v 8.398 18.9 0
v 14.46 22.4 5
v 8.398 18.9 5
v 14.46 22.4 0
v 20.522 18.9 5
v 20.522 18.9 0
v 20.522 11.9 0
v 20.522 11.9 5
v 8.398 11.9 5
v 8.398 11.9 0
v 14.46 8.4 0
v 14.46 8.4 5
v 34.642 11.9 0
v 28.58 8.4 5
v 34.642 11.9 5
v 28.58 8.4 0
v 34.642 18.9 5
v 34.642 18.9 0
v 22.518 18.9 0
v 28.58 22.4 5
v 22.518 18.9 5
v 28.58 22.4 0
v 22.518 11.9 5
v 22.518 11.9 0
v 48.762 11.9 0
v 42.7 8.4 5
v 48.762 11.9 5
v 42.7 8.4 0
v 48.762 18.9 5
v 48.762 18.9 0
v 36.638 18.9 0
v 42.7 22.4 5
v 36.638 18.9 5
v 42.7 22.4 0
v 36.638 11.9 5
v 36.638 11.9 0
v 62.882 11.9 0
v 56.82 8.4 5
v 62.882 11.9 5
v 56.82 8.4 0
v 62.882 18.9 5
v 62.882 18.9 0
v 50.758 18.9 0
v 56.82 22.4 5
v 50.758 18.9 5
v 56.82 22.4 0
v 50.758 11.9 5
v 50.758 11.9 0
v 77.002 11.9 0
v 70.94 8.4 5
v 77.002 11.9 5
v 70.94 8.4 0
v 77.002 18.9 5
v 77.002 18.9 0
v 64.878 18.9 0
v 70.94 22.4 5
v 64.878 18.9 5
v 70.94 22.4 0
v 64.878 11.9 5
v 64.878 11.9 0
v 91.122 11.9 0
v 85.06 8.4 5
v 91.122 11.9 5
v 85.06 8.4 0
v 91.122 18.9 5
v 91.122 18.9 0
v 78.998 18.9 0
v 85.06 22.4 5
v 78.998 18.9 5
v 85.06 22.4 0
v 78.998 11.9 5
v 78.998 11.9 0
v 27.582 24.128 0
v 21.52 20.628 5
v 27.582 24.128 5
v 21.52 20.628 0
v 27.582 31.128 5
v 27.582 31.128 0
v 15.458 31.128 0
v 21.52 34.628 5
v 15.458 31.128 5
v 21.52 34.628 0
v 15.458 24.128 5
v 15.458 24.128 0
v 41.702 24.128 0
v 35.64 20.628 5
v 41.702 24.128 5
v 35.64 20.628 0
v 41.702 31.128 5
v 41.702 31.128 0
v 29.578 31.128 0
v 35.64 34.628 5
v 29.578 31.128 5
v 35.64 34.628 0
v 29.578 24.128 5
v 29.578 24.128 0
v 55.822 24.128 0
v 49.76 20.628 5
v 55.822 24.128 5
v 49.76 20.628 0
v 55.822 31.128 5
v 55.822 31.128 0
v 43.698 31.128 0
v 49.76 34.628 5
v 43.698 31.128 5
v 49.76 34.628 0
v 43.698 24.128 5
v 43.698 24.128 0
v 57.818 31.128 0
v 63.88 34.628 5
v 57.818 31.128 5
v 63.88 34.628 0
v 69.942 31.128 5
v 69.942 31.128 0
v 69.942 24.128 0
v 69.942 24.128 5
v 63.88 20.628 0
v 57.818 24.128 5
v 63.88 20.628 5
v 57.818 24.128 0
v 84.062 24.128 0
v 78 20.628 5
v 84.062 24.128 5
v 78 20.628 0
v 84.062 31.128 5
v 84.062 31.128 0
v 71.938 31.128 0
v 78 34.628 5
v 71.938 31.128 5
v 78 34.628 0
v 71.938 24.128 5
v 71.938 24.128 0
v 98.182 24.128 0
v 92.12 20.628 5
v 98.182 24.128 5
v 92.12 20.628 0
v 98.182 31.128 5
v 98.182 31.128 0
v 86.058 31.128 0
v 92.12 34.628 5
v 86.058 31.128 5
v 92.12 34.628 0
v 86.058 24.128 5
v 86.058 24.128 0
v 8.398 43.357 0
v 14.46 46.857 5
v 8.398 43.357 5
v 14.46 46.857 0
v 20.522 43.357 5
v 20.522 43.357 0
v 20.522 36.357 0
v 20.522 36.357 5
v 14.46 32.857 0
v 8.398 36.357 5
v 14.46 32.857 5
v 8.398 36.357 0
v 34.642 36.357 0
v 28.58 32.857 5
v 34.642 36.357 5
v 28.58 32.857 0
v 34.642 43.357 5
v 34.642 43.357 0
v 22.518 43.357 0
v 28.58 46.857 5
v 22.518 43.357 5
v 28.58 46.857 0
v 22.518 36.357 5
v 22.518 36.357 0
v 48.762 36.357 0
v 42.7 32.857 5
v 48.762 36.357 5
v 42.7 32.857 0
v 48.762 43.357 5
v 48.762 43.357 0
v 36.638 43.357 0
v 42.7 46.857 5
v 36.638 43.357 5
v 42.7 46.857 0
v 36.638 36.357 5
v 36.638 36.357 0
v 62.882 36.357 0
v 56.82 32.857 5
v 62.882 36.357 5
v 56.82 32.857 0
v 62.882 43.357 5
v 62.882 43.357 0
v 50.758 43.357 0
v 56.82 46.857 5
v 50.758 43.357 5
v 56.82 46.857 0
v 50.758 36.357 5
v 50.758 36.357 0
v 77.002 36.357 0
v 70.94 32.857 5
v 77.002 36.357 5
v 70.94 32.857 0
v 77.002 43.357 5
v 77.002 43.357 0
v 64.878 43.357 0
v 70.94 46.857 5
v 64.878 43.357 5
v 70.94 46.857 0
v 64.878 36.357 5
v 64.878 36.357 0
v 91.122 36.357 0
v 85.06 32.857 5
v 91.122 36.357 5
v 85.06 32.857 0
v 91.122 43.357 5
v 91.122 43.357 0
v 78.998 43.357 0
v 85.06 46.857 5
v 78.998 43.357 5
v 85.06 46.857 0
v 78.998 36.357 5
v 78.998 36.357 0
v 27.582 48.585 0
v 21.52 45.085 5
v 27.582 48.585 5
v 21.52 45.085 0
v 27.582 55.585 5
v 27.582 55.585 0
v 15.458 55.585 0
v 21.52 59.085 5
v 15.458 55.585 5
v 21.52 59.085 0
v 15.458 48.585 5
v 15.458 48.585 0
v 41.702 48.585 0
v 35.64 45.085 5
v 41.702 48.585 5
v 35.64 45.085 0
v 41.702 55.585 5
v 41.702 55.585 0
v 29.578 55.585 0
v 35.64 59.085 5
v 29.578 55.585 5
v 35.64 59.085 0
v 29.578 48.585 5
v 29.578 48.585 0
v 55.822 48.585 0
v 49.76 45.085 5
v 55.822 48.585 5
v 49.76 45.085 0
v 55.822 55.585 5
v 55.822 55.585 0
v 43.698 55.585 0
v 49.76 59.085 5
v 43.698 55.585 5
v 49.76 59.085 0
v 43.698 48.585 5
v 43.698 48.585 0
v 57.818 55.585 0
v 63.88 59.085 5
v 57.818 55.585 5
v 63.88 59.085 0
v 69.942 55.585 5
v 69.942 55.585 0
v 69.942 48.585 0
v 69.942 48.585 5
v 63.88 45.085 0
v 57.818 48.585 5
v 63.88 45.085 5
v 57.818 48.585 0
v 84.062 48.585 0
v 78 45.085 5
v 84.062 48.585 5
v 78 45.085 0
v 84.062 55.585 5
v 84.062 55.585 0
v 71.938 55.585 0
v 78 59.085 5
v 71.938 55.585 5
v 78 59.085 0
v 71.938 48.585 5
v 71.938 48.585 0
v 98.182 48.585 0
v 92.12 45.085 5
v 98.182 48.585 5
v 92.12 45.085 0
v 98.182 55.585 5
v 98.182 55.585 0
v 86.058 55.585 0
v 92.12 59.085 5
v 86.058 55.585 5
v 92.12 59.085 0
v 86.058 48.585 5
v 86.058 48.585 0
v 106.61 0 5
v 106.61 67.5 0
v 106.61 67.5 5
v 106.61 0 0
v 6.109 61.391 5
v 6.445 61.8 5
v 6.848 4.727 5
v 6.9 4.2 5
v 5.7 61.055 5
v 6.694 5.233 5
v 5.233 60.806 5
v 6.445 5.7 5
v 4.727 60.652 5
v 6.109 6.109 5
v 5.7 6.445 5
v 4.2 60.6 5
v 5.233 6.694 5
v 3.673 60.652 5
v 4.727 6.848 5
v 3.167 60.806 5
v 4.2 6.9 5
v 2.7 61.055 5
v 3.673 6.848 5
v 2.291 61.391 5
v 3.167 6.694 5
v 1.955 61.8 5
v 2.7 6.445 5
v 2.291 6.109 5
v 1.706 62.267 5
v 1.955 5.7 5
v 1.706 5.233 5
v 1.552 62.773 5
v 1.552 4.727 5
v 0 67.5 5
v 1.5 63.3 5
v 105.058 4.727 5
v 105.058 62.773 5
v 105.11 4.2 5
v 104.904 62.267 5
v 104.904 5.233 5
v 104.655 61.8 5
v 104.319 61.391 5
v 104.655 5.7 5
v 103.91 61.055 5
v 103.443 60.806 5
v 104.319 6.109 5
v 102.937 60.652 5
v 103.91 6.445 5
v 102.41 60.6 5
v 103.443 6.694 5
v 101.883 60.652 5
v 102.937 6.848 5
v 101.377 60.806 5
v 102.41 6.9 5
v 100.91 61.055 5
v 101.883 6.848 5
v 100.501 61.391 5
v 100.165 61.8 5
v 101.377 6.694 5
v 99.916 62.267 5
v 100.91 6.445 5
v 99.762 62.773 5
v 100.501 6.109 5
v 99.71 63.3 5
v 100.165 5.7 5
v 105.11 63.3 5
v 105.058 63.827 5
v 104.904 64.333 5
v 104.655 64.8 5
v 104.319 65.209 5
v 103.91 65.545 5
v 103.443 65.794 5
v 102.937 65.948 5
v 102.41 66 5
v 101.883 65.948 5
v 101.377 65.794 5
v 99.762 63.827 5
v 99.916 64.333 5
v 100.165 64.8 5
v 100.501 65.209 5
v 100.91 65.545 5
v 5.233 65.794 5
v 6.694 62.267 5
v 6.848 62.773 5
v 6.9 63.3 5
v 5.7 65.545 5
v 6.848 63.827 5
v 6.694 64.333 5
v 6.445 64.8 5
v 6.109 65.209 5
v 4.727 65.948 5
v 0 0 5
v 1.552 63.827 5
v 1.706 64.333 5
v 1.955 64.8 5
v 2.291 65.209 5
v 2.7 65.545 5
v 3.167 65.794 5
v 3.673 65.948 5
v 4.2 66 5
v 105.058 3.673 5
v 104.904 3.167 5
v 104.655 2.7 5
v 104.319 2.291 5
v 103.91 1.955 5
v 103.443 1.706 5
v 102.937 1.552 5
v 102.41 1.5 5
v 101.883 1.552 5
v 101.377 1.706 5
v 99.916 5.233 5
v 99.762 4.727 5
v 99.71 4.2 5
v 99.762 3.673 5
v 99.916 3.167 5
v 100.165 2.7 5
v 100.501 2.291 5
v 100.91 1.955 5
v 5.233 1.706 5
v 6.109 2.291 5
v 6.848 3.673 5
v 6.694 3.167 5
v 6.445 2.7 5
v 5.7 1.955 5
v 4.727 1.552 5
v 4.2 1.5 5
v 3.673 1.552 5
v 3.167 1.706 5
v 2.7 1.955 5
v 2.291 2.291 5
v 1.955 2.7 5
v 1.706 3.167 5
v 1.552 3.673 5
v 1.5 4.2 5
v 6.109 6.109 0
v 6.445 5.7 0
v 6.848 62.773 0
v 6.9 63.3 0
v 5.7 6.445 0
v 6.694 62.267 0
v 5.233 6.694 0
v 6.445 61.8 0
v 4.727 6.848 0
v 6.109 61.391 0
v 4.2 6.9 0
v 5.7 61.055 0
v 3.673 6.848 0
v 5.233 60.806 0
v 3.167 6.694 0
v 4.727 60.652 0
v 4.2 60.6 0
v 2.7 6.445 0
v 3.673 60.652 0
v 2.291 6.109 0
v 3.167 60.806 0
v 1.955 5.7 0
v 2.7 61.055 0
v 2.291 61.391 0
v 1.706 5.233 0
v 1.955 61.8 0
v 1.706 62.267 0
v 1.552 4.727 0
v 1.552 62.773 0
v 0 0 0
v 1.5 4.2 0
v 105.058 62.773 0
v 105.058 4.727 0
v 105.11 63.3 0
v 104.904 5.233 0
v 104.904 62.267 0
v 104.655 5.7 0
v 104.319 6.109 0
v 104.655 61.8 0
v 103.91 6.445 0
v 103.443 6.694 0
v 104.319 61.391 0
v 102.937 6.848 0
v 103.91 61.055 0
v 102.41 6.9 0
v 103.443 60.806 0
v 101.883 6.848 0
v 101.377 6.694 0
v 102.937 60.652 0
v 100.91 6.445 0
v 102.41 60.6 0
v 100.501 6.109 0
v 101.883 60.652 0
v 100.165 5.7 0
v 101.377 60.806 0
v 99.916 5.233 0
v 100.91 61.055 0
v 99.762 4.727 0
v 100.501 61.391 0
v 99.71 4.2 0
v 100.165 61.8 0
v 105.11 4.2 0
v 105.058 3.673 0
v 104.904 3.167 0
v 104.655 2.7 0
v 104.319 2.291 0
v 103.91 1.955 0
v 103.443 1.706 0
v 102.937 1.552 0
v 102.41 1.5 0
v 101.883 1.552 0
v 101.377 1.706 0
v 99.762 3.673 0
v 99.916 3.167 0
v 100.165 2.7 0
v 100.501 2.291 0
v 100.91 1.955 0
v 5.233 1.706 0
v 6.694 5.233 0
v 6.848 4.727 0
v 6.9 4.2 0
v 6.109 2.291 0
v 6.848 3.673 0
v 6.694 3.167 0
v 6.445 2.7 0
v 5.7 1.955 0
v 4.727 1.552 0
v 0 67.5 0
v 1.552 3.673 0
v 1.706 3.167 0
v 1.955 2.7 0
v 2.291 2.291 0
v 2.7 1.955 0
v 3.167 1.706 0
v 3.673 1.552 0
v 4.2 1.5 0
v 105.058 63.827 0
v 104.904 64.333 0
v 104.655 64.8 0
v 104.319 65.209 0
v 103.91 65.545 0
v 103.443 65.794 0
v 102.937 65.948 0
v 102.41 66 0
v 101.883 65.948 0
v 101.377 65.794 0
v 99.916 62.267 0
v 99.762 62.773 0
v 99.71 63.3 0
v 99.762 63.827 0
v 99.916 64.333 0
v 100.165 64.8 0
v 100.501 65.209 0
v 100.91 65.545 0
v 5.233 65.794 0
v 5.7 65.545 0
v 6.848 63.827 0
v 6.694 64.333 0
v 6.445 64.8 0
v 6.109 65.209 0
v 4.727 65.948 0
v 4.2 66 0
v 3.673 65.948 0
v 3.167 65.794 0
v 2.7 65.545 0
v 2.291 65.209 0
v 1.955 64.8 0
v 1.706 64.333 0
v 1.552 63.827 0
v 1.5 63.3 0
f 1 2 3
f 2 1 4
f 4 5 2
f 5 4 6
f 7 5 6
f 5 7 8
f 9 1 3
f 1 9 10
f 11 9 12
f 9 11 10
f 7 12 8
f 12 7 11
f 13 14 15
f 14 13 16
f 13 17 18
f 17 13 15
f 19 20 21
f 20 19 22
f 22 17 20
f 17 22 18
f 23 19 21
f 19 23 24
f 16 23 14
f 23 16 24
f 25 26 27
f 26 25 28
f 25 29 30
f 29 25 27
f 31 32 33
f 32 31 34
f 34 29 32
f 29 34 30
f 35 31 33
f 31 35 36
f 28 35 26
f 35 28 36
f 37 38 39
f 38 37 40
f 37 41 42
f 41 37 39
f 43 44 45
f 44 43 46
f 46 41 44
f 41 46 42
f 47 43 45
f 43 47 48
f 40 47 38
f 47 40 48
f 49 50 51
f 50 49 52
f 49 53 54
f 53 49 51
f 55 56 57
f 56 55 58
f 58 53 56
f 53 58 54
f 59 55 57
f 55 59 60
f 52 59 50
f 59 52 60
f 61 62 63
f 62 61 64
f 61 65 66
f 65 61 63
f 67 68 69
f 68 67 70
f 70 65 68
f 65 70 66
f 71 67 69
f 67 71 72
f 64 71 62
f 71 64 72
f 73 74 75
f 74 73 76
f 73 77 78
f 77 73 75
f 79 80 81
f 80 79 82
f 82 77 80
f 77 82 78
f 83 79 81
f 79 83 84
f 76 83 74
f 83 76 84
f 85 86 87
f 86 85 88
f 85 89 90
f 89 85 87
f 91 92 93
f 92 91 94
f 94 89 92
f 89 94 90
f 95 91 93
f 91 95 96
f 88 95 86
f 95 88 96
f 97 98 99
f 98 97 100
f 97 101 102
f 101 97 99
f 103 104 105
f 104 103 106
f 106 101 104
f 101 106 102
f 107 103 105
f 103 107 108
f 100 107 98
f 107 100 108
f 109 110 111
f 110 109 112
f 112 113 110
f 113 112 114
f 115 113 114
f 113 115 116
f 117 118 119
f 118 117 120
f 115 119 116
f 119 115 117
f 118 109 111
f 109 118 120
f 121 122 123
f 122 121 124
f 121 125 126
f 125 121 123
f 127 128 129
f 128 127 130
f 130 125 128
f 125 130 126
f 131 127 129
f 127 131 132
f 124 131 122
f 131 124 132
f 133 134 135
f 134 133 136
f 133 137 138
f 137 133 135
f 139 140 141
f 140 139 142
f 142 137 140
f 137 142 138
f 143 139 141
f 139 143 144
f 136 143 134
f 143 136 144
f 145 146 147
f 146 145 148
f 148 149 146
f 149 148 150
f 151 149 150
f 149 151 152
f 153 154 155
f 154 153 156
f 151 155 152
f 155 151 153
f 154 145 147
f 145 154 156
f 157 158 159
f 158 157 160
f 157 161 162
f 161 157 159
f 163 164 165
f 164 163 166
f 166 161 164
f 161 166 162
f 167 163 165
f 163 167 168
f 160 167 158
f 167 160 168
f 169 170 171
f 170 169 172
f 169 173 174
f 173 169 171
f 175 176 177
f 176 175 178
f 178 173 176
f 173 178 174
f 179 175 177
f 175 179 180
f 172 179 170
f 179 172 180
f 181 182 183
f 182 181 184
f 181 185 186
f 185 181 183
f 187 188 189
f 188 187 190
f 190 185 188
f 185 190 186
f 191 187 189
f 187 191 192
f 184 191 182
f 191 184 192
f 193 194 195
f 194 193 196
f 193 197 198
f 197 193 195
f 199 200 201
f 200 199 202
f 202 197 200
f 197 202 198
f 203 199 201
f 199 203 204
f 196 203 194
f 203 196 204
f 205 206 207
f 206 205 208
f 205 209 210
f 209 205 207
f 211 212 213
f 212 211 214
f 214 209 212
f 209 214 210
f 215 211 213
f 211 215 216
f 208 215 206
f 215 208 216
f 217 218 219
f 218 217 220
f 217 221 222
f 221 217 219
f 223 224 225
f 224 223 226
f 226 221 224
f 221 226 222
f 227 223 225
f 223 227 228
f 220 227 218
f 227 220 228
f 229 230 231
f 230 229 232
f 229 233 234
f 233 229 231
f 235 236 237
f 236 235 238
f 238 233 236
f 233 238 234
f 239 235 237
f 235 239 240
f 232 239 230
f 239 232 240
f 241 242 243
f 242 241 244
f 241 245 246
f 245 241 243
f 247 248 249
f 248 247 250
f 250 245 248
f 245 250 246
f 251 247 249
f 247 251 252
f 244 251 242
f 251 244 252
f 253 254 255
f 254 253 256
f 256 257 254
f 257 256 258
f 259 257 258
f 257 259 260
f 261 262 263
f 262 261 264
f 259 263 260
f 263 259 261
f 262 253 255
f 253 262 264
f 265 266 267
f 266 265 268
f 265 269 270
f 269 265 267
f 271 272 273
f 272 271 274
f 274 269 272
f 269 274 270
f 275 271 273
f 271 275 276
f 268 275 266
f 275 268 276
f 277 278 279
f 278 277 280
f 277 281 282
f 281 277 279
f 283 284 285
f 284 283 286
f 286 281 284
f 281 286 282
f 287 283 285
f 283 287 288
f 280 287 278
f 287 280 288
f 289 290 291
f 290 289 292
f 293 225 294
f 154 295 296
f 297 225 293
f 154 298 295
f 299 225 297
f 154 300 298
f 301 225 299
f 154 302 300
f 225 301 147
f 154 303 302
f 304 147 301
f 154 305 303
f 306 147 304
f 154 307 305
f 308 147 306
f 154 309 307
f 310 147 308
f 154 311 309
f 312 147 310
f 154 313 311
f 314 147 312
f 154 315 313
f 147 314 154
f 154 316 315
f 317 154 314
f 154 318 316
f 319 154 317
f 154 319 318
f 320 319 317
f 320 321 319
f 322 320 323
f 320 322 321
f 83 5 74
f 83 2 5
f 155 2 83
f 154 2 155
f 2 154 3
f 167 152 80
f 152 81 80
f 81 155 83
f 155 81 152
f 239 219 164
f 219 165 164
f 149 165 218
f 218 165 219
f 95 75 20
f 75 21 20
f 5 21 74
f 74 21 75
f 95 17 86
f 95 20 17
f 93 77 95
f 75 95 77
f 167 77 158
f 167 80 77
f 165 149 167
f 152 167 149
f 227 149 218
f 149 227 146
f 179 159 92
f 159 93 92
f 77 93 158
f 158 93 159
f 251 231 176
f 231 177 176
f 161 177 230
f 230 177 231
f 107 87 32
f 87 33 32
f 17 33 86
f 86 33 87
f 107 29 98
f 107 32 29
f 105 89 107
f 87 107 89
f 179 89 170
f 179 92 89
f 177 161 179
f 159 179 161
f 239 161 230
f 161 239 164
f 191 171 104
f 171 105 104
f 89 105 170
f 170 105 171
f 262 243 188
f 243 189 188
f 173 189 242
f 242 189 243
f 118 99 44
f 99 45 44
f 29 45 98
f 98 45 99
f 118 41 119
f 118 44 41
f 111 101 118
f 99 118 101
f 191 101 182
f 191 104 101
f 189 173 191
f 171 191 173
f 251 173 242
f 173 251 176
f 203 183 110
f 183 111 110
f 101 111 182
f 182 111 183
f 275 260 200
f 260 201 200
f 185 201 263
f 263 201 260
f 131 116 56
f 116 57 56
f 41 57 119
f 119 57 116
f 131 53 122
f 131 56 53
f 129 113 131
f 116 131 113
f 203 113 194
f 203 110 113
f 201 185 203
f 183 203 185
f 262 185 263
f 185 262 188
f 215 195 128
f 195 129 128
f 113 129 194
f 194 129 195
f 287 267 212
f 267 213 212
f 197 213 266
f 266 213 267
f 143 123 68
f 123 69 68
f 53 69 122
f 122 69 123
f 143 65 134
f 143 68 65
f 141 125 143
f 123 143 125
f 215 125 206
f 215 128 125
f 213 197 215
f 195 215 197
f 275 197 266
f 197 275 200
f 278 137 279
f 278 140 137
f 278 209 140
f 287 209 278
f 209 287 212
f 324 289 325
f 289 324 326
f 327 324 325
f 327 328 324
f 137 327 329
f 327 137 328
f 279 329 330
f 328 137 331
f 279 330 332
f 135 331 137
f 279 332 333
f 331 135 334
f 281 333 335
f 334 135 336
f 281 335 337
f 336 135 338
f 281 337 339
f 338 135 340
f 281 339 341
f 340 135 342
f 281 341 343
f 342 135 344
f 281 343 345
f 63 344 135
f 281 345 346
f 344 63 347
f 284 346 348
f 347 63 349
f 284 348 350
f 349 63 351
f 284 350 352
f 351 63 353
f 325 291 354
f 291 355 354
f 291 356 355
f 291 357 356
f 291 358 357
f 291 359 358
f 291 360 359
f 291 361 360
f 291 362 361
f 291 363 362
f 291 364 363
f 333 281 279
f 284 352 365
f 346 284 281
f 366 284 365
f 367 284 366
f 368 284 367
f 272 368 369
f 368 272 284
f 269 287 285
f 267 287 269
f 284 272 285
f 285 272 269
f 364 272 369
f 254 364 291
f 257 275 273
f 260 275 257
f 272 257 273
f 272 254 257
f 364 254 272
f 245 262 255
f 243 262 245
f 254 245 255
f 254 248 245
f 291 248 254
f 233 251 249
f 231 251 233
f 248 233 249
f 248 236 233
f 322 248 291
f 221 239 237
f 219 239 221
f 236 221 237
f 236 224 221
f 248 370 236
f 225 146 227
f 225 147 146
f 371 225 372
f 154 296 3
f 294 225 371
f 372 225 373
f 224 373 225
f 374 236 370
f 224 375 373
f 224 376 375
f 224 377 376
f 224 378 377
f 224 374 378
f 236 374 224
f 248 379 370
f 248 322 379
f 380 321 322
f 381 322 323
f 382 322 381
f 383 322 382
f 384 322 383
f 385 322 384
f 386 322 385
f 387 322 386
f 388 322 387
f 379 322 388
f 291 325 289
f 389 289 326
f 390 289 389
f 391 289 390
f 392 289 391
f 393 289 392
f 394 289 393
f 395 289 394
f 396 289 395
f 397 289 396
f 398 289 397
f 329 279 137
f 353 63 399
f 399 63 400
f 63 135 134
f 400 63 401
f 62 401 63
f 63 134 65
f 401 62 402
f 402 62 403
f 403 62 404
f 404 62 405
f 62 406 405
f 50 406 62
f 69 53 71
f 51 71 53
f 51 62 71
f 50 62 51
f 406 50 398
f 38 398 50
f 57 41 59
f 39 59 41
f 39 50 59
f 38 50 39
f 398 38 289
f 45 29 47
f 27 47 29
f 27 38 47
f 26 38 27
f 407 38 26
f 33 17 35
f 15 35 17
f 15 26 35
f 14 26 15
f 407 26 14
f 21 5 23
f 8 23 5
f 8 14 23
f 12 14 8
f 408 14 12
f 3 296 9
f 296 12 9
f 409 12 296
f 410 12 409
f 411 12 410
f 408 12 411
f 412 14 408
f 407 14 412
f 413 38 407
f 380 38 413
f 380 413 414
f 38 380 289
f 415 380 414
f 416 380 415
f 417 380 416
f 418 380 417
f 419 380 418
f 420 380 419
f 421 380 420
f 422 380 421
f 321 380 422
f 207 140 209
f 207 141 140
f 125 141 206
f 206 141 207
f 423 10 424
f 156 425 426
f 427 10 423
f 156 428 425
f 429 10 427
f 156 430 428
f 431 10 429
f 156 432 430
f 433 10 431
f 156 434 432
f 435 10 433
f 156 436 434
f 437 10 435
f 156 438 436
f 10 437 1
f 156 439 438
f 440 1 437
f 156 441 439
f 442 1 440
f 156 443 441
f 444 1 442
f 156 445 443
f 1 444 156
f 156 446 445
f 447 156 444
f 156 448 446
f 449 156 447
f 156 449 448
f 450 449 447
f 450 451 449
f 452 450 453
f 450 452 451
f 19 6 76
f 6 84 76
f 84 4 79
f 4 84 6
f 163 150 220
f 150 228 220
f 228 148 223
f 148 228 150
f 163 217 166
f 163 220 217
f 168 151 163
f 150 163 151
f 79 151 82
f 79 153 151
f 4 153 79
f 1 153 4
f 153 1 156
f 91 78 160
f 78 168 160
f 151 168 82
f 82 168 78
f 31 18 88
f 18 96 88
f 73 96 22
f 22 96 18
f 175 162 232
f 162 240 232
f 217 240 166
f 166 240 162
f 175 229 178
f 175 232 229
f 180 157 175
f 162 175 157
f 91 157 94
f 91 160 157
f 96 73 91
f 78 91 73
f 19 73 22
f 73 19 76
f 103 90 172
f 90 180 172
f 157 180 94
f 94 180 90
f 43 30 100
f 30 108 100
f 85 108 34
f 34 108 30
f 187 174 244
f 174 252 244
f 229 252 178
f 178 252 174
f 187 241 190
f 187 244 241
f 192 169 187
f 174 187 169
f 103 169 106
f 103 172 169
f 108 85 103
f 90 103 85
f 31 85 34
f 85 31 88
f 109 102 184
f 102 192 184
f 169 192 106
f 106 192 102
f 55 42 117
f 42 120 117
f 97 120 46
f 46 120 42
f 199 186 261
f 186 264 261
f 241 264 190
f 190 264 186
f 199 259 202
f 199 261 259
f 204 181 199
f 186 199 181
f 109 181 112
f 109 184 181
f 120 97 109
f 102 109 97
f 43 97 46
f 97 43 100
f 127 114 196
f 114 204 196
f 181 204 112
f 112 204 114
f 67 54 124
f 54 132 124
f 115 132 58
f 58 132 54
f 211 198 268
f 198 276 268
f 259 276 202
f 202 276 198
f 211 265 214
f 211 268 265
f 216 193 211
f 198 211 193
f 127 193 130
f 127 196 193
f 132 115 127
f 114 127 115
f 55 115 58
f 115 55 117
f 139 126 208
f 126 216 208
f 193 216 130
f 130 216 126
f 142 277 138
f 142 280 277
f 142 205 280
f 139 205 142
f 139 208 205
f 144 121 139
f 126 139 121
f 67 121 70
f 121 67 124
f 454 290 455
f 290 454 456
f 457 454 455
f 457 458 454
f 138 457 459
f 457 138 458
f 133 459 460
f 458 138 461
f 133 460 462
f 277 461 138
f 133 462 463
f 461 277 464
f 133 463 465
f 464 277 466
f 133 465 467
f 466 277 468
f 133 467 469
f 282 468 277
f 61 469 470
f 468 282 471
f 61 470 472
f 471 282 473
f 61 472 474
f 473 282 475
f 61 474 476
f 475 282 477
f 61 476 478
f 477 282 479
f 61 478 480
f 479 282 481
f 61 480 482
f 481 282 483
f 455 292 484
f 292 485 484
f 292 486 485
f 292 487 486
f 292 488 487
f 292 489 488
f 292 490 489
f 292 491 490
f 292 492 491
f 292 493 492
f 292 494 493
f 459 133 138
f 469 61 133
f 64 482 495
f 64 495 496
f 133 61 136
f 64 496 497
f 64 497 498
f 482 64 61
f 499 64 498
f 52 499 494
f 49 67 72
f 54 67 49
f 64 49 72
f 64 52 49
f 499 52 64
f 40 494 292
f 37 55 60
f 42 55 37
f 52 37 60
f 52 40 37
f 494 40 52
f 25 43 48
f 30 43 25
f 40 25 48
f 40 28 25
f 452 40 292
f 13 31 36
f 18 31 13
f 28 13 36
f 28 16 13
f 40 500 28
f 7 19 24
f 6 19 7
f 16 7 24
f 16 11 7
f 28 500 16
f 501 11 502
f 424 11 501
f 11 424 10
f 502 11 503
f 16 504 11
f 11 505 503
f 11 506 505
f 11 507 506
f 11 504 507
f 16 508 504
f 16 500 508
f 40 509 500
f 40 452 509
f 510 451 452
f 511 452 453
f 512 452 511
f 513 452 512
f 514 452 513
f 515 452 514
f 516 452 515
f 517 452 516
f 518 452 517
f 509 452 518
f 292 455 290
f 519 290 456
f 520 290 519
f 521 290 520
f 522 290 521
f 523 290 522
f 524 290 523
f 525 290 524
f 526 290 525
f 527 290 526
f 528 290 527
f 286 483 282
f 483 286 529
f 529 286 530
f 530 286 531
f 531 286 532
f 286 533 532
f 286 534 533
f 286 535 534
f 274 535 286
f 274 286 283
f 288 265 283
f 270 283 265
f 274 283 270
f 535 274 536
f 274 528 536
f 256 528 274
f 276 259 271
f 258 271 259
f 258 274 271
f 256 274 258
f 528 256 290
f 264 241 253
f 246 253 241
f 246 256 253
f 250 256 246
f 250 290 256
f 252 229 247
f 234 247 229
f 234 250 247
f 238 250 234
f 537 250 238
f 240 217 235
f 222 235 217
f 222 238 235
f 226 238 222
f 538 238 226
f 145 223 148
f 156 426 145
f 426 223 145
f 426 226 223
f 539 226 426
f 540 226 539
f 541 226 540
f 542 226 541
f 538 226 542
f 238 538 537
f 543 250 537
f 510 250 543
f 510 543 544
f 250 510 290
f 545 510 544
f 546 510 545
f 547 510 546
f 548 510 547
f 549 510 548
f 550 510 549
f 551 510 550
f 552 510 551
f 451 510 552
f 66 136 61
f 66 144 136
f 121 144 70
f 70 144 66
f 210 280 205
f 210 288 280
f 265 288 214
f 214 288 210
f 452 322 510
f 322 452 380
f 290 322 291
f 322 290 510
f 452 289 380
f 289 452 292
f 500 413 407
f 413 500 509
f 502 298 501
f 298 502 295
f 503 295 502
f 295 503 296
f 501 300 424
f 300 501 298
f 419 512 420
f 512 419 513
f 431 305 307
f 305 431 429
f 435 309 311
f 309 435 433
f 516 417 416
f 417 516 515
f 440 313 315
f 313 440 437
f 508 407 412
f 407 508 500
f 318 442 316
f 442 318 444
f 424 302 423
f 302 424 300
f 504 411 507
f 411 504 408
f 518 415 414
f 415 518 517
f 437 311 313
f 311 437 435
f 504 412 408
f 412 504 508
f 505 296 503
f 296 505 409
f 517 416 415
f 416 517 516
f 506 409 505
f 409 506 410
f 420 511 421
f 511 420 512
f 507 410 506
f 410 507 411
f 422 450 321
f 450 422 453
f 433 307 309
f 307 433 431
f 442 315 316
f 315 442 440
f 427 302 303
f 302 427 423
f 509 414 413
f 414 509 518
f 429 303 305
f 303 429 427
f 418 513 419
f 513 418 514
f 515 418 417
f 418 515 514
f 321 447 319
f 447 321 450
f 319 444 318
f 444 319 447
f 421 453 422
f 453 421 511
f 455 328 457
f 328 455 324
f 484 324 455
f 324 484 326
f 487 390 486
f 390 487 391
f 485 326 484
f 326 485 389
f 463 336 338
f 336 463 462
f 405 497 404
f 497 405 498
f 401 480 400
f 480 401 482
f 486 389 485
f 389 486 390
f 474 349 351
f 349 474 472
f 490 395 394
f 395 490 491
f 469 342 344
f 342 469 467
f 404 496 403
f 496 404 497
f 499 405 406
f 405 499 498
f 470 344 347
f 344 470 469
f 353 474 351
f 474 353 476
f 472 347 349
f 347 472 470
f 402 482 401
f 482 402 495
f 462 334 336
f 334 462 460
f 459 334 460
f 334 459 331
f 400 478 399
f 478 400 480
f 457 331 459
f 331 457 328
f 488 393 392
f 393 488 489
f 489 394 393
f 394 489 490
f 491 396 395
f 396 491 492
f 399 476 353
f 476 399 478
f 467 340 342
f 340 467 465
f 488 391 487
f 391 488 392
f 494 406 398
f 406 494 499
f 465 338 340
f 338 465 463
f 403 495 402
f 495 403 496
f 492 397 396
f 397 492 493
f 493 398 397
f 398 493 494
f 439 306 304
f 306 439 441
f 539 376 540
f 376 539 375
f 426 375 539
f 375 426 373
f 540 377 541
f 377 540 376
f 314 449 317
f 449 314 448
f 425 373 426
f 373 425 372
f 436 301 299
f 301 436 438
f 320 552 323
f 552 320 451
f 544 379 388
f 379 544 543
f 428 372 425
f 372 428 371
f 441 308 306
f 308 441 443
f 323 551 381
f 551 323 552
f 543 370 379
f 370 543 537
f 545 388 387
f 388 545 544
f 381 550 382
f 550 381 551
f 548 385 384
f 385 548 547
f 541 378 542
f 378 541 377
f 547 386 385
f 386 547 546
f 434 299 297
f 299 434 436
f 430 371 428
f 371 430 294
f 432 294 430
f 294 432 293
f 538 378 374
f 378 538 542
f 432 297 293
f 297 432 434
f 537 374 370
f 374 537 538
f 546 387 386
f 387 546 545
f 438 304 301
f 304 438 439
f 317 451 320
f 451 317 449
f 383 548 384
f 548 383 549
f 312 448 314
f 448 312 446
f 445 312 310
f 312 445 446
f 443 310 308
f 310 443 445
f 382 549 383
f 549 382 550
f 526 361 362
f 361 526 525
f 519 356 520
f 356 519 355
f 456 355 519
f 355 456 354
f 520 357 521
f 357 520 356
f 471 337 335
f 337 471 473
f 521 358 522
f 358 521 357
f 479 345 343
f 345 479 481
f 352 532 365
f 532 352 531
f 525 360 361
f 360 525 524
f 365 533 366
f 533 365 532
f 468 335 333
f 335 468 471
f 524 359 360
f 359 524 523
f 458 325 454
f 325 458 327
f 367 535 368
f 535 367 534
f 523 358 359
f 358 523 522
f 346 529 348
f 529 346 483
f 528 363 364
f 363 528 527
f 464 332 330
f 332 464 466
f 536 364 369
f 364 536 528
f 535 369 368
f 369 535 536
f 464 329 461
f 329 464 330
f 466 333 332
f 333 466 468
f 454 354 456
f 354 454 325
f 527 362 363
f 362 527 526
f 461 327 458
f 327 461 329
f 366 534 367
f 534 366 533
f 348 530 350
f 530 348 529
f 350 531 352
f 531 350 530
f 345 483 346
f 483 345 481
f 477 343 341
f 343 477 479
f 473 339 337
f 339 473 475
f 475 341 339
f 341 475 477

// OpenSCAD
$fn = 32;

// ----------------------------------------------------------------------
// Honeycomb panel: 106.61 x 67.5 mm, 24 cells of 14 mm
// ----------------------------------------------------------------------

// --- parameters (mm) ---
panel_w = 106.61;         // panel width
panel_d = 67.5;           // panel depth
thick = 5;                // panel thickness
cell_r = 7;               // hex cell circumradius
pitch = 14.12;            // hex cell pitch (centre to centre)
web = 2;                  // web between the cells
columns = 6;              // columns of cells
rows = 4;                 // rows of cells
cell_count = 24;          // total cells
shift_x = 14.46;          // first cell offset in x
shift_y = 15.4;           // first cell offset in y
mount_d = 5.4;            // corner mounting holes
hole_off = 4.2;           // mounting hole offset from the corners

difference() {
  union() {
    cube([panel_w, panel_d, thick]);
  }
  /* hexagonal cells, point-up, cut right through the plate */
  for (row = [0 : rows - 1]) {
    for (col = [0 : columns - 1]) {
      translate([shift_x + col * pitch + (row % 2) * pitch / 2, shift_y + row * pitch * 0.866025, -2.5]) rotate([0, 0, 30]) cylinder(h = thick + 5, d = 2 * cell_r, $fn = 6);
    }
  }
  /* corner mounting holes, clear of the outer cell web */
  translate([4.2, 4.2, -2.5]) cylinder(h = thick + 5, d = mount_d);
  translate([102.41, 4.2, -2.5]) cylinder(h = thick + 5, d = mount_d);
  translate([4.2, 63.3, -2.5]) cylinder(h = thick + 5, d = mount_d);
  translate([102.41, 63.3, -2.5]) cylinder(h = thick + 5, d = mount_d);
}
